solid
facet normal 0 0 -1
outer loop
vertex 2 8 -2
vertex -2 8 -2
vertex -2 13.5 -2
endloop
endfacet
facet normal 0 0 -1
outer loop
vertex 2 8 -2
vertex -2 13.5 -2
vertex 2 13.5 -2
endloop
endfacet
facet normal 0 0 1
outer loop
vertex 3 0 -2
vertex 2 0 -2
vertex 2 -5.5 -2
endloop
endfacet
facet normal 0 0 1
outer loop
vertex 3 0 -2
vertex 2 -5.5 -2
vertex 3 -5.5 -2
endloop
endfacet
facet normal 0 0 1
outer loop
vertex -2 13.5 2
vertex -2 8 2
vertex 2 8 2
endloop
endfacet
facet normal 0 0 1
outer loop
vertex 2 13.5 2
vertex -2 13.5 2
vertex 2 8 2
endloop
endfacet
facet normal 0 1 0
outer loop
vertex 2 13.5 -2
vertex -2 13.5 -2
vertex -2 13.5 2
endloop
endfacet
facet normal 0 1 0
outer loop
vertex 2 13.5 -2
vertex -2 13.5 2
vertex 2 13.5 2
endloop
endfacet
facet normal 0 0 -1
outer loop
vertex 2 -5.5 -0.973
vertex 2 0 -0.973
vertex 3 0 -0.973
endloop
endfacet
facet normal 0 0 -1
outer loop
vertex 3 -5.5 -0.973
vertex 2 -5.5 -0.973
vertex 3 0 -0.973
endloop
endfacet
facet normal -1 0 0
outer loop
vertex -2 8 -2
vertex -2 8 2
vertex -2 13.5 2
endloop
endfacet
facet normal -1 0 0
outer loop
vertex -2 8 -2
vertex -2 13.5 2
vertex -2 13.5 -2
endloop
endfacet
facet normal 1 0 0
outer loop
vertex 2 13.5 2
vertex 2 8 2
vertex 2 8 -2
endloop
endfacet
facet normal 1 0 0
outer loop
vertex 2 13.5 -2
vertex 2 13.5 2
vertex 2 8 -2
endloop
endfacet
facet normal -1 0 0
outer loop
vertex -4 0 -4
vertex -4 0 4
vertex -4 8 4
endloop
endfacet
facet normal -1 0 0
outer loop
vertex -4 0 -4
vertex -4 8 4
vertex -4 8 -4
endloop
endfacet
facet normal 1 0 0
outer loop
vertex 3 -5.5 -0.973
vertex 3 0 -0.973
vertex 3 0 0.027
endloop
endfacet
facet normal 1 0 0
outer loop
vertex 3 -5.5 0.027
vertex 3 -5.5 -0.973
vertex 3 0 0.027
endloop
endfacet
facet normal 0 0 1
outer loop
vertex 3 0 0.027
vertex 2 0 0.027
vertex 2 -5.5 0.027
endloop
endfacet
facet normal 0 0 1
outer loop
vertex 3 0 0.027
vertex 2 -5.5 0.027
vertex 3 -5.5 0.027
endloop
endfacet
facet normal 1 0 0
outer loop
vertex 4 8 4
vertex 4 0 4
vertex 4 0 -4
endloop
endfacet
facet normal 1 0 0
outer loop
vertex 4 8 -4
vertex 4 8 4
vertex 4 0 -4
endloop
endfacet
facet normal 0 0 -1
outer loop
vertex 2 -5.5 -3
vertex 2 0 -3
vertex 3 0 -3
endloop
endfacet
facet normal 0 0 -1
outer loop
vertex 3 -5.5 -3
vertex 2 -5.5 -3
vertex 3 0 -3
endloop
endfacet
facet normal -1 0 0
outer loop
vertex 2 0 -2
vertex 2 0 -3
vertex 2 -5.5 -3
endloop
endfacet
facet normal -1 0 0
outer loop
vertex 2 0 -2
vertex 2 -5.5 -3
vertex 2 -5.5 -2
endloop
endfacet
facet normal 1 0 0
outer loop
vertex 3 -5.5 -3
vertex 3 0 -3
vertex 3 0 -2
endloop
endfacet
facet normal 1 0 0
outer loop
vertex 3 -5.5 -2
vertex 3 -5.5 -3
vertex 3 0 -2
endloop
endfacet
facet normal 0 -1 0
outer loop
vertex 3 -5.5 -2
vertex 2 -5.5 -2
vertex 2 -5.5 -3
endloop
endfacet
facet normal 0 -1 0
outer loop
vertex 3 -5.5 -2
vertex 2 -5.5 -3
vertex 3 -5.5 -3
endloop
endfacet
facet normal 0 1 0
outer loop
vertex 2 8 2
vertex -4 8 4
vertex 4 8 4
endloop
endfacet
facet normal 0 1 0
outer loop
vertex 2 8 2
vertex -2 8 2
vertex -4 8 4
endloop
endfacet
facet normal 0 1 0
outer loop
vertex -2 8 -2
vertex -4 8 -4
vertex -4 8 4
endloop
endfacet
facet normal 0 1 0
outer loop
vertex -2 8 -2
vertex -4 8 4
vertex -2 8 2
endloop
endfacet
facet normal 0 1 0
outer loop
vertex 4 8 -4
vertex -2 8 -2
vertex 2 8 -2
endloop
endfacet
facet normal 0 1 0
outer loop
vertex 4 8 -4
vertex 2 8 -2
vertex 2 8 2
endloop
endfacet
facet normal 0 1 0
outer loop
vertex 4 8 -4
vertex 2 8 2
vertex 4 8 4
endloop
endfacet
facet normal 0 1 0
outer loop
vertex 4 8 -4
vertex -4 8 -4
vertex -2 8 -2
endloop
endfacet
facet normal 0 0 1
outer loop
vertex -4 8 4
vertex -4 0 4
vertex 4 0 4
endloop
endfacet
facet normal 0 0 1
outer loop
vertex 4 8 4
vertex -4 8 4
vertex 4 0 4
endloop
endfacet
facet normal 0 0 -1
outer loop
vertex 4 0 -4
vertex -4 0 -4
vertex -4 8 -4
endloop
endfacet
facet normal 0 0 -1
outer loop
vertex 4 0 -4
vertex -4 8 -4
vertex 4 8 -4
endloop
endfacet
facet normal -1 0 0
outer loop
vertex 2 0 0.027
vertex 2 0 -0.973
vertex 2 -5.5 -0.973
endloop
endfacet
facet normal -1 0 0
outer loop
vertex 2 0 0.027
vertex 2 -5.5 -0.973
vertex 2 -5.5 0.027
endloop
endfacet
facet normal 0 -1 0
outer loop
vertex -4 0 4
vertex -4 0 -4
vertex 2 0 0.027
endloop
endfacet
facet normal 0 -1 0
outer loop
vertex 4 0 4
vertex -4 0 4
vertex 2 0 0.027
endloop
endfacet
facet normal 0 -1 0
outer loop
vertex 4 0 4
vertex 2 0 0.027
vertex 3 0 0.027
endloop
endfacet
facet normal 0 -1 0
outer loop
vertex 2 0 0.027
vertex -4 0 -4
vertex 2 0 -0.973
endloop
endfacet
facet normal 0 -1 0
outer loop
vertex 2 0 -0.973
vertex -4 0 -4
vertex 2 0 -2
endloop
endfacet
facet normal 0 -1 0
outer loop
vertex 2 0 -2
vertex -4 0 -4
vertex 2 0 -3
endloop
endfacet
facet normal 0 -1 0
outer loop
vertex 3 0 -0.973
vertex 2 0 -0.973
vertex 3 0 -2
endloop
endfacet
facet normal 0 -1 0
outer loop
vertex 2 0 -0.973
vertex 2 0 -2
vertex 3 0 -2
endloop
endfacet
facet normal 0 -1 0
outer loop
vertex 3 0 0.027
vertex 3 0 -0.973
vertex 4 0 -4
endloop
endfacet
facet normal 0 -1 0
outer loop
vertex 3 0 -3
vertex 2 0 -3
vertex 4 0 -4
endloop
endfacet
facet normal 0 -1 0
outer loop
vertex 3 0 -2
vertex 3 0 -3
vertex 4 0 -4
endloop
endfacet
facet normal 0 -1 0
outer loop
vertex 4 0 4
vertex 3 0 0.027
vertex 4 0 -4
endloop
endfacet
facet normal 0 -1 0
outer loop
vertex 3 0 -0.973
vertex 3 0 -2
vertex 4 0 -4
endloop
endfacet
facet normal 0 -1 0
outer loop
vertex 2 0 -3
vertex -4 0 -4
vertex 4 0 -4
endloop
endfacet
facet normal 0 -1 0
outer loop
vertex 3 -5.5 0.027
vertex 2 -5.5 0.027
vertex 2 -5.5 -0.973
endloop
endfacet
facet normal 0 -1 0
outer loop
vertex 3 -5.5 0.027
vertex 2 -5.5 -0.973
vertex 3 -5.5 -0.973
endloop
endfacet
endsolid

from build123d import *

# Parameters (mm, degrees)
SKETCH1_W           = 8
SKETCH1_H           = 8
BOSS_EXTRUDE1_DEPTH = 8
SKETCH2_W           = 4
SKETCH2_H           = 4
BOSS_EXTRUDE2_DEPTH = 5.5
SKETCH3_W           = 1
SKETCH3_H           = 1
BOSS_EXTRUDE3_DEPTH = 5.5


with BuildPart() as part:
    # Sketch1 → Boss-Extrude1 (new body)
    with BuildSketch(Plane(origin=(0, 0, 0), x_dir=(1, 0, 0), z_dir=(0, 1, 0))):
        Rectangle(SKETCH1_W, SKETCH1_H)
    extrude(amount=BOSS_EXTRUDE1_DEPTH)

    # Sketch2 → Boss-Extrude2 (add)
    with BuildSketch(Plane(origin=(0, 8, 0), x_dir=(1, 0, 0), z_dir=(0, 1, 0))):
        Rectangle(SKETCH2_W, SKETCH2_H)
    extrude(amount=BOSS_EXTRUDE2_DEPTH)

    # Sketch3 → Boss-Extrude3 (add)
    with BuildSketch(Plane.XZ):
        with Locations((2.5, -2.5)):
            Rectangle(SKETCH3_W, SKETCH3_H)
        with Locations((2.5, -0.47334968)):
            Rectangle(SKETCH3_W, SKETCH3_H)
    extrude(amount=BOSS_EXTRUDE3_DEPTH)


solid = part.part
